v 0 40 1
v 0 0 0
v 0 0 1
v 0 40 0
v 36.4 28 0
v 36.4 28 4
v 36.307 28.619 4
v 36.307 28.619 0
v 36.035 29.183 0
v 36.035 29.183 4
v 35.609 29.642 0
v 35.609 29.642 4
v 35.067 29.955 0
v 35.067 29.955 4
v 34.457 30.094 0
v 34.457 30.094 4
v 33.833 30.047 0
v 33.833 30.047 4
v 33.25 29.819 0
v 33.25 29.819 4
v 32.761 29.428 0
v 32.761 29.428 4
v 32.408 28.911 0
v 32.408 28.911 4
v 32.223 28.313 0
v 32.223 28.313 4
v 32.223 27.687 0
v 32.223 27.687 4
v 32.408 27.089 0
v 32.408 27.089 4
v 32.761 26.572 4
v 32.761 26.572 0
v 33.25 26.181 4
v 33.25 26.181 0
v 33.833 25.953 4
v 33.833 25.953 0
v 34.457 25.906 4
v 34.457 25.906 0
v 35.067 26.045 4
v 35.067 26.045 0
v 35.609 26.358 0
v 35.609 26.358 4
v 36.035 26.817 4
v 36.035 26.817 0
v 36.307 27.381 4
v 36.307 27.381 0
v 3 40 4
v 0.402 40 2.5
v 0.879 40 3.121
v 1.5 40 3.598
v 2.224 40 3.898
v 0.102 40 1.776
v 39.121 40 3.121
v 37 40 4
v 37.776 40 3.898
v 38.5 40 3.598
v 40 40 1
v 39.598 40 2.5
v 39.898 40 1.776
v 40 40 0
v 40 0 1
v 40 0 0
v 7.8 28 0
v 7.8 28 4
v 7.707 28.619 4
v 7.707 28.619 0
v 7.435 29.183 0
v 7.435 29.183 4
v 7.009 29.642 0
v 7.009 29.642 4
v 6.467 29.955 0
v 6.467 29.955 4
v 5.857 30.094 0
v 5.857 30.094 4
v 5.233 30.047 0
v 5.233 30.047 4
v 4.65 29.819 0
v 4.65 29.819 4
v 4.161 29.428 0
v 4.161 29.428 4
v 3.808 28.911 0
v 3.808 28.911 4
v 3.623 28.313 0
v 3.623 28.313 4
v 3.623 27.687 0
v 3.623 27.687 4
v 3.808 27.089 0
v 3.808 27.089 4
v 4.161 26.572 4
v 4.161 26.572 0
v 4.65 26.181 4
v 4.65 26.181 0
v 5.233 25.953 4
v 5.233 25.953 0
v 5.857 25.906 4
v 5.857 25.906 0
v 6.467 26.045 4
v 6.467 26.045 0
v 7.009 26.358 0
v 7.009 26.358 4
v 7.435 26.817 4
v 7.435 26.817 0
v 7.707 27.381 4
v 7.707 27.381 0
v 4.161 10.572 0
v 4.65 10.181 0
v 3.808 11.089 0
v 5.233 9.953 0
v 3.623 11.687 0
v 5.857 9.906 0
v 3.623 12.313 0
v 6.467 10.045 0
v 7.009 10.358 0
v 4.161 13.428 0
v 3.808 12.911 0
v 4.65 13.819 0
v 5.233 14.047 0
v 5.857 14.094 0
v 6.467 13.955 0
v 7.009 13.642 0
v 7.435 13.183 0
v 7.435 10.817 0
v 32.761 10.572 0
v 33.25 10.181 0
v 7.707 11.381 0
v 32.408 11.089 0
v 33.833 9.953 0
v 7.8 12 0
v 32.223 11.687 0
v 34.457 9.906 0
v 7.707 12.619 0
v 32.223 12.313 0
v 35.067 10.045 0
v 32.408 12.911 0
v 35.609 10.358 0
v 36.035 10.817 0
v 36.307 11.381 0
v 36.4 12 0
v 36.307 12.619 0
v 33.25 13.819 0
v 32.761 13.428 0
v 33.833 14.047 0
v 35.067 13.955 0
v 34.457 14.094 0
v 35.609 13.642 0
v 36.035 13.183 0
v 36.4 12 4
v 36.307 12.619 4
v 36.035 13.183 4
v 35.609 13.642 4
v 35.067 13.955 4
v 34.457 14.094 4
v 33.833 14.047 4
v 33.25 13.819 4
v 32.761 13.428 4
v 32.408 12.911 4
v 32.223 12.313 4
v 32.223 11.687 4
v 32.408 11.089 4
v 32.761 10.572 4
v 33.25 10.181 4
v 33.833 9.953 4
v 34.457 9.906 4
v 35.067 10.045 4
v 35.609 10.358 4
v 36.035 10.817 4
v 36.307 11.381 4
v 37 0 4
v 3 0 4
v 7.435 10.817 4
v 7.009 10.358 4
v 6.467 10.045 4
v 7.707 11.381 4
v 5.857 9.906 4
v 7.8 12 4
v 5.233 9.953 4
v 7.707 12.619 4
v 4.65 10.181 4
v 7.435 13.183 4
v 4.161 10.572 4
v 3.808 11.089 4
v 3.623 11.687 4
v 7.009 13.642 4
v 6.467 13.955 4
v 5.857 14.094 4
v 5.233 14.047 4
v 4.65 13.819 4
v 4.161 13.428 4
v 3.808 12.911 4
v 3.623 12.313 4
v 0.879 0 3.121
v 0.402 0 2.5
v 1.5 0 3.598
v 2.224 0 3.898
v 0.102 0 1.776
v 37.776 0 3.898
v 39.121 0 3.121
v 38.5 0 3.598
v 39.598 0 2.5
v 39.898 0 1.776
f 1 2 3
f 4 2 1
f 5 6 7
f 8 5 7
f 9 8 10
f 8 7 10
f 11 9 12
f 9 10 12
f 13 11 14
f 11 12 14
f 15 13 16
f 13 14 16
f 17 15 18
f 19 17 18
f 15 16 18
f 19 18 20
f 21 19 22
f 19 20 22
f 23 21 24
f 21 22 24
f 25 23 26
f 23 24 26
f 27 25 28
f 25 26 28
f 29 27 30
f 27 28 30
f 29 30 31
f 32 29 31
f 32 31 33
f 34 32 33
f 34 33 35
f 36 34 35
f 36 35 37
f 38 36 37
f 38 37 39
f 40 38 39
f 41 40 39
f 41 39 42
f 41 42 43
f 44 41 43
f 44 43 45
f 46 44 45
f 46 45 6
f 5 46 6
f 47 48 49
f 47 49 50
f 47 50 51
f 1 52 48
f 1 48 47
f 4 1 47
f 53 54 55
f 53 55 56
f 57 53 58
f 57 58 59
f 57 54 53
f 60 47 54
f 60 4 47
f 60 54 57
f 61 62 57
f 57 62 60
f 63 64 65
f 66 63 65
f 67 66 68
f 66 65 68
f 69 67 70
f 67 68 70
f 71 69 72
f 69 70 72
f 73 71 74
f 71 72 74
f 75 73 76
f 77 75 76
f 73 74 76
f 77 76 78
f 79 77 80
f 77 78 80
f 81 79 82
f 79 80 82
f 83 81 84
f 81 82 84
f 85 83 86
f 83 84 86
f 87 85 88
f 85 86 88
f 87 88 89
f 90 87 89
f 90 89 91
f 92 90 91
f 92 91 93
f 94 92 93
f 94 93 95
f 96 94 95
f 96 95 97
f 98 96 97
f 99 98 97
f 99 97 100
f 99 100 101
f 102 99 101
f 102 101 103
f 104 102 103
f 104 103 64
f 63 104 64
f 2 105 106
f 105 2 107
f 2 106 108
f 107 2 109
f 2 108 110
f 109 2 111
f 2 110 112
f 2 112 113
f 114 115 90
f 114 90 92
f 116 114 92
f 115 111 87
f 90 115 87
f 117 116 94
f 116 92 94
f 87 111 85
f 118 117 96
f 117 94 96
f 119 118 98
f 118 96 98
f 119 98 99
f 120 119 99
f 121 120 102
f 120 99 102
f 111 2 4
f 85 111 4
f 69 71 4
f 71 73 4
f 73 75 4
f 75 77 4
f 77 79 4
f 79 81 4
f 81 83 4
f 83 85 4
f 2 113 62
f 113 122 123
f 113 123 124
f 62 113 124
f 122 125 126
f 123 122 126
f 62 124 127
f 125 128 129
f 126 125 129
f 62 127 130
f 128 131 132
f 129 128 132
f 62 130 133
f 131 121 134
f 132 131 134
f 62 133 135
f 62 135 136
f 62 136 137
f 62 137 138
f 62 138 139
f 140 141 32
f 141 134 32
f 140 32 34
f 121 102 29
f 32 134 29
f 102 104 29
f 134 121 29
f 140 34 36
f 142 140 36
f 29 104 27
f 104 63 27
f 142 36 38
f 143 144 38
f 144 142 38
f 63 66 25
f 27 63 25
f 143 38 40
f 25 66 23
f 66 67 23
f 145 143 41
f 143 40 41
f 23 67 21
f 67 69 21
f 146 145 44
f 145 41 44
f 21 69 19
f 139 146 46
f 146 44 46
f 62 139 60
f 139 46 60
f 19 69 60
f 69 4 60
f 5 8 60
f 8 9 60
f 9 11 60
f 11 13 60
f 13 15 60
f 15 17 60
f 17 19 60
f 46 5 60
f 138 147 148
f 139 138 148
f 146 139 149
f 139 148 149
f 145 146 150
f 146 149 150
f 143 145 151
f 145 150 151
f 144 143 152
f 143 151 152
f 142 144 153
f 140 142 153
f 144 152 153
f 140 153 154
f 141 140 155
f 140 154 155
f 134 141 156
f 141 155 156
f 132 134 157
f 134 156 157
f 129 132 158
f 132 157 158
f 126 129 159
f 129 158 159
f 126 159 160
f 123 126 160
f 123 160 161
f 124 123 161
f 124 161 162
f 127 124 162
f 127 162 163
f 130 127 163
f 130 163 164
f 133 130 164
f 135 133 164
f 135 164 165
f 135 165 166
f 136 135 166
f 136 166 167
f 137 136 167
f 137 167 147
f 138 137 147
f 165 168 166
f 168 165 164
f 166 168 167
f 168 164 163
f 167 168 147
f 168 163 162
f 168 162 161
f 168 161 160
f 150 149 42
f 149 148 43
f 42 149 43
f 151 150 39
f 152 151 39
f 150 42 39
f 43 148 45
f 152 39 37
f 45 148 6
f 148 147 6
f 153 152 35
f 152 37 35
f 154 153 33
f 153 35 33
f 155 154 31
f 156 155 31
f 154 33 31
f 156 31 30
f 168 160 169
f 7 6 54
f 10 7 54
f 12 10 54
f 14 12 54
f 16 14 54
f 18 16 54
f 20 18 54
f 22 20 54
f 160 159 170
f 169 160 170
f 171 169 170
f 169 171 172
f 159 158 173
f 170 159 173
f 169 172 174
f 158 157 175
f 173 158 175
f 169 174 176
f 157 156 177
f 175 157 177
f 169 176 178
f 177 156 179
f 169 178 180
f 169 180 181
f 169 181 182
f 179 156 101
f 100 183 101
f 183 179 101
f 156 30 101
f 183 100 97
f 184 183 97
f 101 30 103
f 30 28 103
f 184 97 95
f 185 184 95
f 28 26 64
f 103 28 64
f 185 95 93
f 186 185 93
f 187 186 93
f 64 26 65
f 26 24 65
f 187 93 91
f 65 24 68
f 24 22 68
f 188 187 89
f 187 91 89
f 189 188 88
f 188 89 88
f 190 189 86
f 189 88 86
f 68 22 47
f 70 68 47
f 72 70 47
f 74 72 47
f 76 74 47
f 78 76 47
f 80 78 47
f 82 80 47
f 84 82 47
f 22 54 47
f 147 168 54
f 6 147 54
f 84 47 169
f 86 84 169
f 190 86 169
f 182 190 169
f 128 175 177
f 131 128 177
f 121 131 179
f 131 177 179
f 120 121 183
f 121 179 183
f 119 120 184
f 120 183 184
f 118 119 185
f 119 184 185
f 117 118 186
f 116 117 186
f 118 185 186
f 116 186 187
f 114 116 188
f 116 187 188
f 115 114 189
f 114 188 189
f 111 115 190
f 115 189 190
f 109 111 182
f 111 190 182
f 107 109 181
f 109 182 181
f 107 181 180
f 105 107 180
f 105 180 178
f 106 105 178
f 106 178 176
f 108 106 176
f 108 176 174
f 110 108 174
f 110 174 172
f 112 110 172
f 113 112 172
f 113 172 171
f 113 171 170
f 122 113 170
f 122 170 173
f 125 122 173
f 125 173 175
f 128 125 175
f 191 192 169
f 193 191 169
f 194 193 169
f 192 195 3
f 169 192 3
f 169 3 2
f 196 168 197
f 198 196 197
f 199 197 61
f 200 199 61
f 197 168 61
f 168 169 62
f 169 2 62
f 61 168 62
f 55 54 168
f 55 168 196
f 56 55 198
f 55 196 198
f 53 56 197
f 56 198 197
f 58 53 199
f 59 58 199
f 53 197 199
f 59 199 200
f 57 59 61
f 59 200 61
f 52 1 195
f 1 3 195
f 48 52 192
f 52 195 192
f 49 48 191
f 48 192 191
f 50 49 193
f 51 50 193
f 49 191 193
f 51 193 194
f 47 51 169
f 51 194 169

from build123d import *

# Parameters (mm, degrees)
F0_W     = 40
F0_H     = 40
F1_DEPTH = 8
F2_R     = 2.1
F3_DEPTH = 25
F4_W     = 40
F4_H     = 4
F5_DEPTH = 100
F6_R     = 3


# Not quite as in the source:
# - a feature names something its author has since deleted; it is built from what else it names


with BuildPart() as f1:
    # F0 (on Top) → F1 (new body)
    with BuildSketch(Plane.XY):
        with Locations((20, 20)):
            Rectangle(F0_W, F0_H)
    extrude(amount=F1_DEPTH)

    # F2 (on face) → F3 (cut)
    with BuildSketch(Plane.XY.offset(8)):
        with Locations((5.7, 12)):
            Circle(F2_R)
        with Locations((5.7, 28)):
            Circle(F2_R)
        with Locations((34.3, 28)):
            Circle(F2_R)
        with Locations((34.3, 12)):
            Circle(F2_R)
    extrude(amount=-F3_DEPTH, mode=Mode.SUBTRACT)

    # F4 (on face) → F5 (cut)
    with BuildSketch(Plane(origin=(0, 40, 0), x_dir=(-1, 0, 0), z_dir=(0, 1, 0))):
        with Locations((-20, 6)):
            Rectangle(F4_W, F4_H)
    extrude(amount=-F5_DEPTH, mode=Mode.SUBTRACT)

    # F6
    f6_edges = [f1.edges().sort_by_distance(p)[0] for p in [
        (0, 20, 4),
        (40, 20, 4),
    ]]
    fillet(f6_edges, radius=F6_R)


solid = f1.part
